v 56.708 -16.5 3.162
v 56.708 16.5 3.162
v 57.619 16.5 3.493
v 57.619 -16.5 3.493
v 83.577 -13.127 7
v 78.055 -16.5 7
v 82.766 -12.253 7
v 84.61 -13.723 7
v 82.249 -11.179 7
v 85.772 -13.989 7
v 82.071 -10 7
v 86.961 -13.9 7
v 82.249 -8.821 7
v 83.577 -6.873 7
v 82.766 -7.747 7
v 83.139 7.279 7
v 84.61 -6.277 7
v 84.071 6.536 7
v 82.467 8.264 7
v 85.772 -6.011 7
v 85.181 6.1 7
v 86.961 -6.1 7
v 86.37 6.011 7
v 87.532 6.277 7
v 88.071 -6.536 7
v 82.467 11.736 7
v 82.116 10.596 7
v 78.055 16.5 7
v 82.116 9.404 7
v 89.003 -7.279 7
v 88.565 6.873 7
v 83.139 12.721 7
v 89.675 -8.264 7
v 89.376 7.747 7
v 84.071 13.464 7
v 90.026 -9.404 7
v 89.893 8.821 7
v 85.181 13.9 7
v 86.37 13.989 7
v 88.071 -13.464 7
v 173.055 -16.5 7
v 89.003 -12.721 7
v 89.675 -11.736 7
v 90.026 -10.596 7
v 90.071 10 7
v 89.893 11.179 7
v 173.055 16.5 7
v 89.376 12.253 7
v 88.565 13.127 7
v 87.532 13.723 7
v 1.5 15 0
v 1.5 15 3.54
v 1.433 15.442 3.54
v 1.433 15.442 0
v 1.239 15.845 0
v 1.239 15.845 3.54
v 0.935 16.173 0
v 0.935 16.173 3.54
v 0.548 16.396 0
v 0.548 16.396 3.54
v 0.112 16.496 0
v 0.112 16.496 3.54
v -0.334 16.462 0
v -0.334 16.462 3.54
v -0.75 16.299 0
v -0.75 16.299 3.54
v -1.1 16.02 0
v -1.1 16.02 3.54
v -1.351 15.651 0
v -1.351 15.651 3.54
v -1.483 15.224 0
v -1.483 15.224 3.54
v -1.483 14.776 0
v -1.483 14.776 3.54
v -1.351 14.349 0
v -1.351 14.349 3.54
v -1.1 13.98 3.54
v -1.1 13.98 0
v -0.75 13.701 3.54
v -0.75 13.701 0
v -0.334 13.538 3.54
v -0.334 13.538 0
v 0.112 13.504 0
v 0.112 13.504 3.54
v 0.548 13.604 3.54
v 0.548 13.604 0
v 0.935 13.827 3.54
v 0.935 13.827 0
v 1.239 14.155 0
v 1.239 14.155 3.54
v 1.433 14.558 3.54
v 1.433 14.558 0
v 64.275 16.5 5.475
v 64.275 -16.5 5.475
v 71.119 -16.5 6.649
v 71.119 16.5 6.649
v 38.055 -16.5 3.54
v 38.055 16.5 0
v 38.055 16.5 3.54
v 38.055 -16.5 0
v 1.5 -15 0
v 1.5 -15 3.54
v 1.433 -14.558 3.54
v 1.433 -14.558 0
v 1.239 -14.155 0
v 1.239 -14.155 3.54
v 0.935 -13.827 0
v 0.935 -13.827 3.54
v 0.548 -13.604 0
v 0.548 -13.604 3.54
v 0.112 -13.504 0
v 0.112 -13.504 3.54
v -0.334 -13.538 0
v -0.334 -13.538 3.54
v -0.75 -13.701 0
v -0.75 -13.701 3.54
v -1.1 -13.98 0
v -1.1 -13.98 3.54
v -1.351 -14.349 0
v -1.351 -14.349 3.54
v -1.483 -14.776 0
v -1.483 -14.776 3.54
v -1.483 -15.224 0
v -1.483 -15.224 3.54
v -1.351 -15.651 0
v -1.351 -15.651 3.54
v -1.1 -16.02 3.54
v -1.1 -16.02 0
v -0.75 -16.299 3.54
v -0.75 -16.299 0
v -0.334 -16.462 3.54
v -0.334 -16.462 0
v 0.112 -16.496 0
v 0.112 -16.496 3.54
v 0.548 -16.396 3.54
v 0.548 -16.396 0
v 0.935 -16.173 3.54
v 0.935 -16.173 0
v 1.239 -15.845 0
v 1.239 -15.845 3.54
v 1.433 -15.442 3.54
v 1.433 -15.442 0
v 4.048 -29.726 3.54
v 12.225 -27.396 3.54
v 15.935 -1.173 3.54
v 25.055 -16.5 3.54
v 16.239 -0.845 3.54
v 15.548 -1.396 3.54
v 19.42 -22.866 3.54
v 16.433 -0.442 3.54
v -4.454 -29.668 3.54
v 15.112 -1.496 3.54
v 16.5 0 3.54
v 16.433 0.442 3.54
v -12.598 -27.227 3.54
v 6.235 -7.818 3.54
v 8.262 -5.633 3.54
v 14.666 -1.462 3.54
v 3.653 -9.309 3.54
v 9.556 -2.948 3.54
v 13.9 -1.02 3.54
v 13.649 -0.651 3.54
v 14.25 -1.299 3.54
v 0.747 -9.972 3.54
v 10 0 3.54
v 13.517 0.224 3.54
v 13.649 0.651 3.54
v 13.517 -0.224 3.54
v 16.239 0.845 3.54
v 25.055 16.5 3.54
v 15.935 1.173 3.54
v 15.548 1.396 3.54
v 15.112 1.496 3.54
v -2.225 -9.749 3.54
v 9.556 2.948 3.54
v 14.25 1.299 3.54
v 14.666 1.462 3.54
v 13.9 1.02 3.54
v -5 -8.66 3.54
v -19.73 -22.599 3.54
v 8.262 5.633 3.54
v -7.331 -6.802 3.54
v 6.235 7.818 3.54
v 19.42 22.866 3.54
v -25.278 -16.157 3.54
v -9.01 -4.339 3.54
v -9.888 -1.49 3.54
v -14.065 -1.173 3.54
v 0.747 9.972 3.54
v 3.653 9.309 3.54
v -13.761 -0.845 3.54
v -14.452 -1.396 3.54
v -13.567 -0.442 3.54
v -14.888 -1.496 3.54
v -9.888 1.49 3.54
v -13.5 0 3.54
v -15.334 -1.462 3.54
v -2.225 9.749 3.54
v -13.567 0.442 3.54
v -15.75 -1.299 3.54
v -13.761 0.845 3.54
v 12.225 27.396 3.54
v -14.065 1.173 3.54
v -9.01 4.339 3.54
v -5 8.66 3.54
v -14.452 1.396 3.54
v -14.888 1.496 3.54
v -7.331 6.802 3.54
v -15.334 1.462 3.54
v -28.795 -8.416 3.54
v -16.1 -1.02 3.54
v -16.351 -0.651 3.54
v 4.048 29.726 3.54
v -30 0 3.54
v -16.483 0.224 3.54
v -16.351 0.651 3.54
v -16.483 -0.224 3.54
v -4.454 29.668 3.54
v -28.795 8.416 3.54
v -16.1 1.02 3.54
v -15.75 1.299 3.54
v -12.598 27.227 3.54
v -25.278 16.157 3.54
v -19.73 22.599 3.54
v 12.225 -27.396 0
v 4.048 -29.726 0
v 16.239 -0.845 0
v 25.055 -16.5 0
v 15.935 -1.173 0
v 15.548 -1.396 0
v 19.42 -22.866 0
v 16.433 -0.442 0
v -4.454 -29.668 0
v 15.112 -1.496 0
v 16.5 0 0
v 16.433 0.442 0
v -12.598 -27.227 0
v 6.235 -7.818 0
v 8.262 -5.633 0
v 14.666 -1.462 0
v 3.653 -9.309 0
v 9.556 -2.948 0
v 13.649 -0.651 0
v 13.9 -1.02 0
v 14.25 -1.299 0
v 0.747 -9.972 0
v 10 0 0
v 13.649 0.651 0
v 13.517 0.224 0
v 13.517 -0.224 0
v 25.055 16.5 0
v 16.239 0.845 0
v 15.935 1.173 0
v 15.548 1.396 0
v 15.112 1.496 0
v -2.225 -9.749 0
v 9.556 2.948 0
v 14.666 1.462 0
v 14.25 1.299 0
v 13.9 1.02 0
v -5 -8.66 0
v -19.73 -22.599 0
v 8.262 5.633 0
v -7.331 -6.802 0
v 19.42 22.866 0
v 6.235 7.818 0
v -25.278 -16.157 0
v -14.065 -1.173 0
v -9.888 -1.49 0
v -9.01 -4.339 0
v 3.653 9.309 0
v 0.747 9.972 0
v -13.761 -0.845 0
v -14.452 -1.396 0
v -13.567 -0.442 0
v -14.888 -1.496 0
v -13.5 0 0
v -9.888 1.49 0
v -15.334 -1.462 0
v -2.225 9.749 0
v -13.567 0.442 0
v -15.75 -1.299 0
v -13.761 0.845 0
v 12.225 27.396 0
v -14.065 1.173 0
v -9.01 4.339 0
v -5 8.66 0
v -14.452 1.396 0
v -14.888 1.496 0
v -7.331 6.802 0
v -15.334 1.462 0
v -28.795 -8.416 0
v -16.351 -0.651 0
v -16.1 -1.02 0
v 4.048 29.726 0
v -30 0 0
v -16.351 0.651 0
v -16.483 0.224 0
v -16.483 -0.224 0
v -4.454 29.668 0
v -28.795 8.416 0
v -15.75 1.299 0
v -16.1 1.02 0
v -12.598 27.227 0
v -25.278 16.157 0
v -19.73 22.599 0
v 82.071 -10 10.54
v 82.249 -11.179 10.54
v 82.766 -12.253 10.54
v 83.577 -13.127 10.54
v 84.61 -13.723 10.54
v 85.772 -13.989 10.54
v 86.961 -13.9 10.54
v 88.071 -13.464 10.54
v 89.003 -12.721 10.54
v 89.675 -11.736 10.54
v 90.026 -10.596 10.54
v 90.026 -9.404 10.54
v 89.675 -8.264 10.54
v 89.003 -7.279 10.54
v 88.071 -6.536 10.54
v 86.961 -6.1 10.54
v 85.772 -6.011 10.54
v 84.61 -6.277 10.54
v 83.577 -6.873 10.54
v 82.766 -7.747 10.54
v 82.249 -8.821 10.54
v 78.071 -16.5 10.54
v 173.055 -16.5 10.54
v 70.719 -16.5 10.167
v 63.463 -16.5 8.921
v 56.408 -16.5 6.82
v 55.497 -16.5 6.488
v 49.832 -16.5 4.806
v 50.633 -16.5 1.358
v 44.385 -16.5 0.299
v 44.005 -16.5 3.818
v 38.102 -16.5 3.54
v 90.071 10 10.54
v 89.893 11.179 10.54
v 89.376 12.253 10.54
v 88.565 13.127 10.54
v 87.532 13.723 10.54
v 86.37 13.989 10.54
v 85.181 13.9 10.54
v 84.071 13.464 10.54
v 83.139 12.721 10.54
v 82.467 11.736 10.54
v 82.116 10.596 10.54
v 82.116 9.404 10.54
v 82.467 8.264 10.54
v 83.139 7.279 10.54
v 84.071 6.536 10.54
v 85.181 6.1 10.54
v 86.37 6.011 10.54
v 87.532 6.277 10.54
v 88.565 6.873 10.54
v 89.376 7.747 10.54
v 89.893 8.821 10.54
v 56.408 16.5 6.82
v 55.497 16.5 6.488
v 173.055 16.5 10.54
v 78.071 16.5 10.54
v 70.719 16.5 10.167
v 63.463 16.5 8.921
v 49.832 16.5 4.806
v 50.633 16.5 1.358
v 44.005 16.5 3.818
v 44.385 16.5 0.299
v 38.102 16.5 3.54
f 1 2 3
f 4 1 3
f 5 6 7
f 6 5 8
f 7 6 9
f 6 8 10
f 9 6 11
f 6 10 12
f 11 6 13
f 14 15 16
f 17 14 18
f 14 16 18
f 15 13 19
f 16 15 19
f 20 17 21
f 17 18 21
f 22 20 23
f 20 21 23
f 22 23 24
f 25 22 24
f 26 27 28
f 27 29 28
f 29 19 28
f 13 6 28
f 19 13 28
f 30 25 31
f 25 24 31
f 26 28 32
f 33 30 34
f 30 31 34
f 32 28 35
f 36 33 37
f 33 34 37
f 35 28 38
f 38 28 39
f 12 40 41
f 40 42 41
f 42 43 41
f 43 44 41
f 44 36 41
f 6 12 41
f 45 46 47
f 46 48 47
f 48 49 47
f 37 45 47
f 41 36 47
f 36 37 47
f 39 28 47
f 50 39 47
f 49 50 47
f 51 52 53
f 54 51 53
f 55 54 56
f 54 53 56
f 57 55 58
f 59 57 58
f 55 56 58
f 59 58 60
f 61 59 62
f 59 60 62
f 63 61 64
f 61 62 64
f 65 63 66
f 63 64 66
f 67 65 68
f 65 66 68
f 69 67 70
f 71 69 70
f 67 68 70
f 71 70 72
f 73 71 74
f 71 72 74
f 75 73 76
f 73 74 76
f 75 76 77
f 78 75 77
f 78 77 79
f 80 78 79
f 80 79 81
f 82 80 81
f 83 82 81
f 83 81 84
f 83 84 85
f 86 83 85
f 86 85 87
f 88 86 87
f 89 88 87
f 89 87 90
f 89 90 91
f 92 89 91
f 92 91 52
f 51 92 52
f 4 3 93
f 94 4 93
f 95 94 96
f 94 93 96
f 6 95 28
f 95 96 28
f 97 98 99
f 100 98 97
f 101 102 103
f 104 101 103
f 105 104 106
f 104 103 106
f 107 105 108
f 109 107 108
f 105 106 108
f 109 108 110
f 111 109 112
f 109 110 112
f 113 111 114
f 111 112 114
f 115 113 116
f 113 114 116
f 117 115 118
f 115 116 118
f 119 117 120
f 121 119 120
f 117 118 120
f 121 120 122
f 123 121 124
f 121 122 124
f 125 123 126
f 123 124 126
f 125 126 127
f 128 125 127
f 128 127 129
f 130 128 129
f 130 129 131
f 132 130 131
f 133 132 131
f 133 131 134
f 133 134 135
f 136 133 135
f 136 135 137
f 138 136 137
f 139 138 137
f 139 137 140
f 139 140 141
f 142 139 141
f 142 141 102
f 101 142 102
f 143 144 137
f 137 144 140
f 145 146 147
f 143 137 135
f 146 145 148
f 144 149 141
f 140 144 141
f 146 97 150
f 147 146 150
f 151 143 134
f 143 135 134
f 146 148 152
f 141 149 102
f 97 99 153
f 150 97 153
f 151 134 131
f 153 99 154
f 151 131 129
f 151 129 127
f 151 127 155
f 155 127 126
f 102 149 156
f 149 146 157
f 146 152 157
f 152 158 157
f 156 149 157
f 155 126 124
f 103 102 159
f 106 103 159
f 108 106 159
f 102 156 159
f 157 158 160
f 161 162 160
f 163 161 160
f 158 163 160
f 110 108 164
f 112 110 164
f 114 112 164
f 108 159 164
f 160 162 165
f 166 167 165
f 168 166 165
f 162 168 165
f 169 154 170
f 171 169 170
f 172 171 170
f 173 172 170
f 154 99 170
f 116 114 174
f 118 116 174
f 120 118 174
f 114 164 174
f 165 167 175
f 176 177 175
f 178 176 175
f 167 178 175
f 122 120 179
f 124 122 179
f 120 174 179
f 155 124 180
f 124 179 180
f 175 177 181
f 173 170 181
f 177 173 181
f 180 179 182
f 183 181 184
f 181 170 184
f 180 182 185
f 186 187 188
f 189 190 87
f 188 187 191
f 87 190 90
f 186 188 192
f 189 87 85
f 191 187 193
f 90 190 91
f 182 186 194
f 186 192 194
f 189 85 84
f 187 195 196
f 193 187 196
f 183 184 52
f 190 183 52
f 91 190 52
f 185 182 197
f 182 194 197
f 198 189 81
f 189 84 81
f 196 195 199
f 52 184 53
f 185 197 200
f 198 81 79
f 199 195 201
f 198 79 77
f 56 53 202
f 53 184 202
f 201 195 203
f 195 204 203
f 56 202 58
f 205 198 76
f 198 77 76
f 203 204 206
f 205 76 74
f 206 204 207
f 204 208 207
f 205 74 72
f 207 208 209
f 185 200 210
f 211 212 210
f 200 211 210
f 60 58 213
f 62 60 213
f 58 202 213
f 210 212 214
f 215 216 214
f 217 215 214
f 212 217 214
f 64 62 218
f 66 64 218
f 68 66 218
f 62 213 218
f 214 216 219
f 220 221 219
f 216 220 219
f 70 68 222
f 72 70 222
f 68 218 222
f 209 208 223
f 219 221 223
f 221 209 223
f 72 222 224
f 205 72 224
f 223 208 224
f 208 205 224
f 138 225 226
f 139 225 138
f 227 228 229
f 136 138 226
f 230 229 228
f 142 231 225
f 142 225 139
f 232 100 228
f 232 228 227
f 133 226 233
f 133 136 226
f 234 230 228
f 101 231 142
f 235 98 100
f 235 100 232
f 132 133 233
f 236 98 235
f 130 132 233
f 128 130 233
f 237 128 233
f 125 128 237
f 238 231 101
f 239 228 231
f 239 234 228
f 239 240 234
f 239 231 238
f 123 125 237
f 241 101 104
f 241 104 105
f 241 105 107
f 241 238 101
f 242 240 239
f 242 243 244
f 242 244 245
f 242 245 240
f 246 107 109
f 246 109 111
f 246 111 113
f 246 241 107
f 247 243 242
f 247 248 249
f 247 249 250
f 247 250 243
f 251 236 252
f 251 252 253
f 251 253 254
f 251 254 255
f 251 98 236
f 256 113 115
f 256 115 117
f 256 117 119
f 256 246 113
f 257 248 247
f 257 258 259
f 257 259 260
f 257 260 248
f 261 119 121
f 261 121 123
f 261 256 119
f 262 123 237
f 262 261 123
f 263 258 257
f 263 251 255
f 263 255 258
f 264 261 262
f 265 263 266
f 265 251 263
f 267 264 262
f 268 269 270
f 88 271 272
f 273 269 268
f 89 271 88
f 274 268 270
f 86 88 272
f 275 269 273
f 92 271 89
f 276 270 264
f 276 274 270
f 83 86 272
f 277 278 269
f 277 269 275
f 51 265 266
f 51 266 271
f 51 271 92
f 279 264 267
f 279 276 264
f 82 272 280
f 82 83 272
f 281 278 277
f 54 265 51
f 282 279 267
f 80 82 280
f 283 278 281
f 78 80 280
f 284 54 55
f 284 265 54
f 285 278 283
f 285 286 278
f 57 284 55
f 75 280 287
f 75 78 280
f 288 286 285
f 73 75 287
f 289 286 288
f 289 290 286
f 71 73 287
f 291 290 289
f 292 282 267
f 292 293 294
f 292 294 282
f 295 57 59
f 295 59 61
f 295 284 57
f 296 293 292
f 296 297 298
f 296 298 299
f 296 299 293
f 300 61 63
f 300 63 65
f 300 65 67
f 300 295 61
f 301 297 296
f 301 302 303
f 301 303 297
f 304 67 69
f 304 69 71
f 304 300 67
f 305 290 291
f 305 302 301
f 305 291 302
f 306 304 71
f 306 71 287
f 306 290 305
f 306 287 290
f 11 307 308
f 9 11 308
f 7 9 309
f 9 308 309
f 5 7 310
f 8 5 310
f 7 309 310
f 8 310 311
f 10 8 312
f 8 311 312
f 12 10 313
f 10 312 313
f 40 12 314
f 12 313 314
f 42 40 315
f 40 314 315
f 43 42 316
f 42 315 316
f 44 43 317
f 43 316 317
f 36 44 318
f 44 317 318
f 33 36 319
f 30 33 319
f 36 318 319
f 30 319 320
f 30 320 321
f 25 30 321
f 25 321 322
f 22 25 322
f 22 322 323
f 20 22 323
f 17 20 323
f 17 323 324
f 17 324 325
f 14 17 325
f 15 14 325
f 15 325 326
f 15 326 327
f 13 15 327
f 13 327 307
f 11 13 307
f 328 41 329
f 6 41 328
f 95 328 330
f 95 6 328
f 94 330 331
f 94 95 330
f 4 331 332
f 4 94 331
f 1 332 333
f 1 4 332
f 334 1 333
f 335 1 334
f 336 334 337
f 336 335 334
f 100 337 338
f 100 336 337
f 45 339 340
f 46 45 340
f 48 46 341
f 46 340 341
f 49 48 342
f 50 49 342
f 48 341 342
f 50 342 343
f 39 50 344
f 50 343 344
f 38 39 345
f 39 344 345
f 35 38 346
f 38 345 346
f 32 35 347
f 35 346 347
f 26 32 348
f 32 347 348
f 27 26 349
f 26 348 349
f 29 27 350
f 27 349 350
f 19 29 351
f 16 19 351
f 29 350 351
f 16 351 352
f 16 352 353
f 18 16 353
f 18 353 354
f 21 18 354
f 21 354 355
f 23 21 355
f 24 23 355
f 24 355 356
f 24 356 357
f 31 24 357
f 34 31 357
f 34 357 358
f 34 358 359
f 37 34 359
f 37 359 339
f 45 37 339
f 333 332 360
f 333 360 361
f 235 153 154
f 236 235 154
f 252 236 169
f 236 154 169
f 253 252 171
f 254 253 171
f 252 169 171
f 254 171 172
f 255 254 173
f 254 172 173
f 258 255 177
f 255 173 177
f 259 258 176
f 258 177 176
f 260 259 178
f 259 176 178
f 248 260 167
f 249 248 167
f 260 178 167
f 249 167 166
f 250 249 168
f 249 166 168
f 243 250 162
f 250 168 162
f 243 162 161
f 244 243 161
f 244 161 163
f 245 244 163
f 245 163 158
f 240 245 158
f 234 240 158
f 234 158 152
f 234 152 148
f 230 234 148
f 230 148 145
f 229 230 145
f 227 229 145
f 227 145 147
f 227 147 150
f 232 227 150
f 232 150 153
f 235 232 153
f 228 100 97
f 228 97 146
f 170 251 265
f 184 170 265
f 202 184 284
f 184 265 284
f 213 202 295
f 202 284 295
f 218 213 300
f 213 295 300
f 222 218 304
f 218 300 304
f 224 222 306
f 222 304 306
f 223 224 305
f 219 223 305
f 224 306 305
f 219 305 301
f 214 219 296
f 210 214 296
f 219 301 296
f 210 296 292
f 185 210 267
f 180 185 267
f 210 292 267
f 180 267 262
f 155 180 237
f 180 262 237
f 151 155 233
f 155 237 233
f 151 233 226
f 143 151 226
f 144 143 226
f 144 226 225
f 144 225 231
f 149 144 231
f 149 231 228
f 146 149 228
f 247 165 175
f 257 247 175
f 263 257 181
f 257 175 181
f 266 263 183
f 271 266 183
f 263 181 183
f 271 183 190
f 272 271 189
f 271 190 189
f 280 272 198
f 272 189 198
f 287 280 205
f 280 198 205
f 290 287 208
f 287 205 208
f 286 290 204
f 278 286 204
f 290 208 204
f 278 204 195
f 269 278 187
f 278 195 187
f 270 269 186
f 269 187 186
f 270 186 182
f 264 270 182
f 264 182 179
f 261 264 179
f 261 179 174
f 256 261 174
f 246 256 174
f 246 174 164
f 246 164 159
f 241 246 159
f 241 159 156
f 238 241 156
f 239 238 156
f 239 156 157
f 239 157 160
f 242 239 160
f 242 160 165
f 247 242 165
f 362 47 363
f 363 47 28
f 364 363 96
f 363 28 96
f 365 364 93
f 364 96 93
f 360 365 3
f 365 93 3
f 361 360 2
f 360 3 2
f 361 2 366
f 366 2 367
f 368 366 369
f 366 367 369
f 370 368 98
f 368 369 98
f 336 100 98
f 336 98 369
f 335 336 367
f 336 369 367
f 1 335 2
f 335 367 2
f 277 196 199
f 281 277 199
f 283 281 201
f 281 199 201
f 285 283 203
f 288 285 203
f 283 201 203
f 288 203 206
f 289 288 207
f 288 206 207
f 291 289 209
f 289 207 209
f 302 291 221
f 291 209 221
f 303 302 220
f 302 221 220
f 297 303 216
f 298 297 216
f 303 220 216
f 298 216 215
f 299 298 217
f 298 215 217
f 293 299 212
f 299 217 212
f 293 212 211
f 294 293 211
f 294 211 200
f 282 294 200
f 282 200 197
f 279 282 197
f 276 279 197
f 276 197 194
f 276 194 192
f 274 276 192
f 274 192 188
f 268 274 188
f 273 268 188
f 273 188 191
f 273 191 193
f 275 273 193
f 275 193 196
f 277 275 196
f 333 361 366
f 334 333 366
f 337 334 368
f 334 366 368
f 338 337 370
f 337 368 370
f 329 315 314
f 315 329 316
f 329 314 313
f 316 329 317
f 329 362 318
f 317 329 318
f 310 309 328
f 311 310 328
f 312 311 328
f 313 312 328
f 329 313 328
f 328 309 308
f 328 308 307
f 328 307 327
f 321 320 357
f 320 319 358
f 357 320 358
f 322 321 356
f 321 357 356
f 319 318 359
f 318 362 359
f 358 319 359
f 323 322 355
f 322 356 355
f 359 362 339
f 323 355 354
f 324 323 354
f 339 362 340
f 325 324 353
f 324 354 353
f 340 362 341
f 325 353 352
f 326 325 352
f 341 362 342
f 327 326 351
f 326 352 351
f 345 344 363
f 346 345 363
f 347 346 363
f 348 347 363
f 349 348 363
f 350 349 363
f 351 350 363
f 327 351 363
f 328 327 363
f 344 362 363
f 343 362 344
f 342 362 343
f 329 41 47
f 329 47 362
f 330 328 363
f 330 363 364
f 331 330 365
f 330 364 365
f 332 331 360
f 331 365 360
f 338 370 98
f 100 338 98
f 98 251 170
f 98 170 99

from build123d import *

# Parameters (mm, degrees)
SKETCH1_R           = 30
BOSS_EXTRUDE1_DEPTH = 3.54
BOSS_EXTRUDE4_START = -3.54
BOSS_EXTRUDE4_DEPTH = 3.54
CUT_EXTRUDE1_REACH  = 50.587
SKETCH5_R           = 10
CUT_EXTRUDE2_REACH  = 50.587
SKETCH6_R           = 1.5
BOSS_EXTRUDE5_DEPTH = 33
SKETCH8_R           = 4
CUT_EXTRUDE3_DEPTH  = 10


with BuildPart() as part:
    # Sketch1 → Boss-Extrude1 (new body)
    with BuildSketch(Plane.XY):
        Circle(SKETCH1_R)
    extrude(amount=BOSS_EXTRUDE1_DEPTH)

    # Sketch4 → Boss-Extrude4 (add)
    with BuildSketch(Plane.XY.offset(3.54).offset(BOSS_EXTRUDE4_START)):
        with BuildLine():
            Line((25.054939633, 16.5), (38.054939633, 16.5))
            Line((38.054939633, 16.5), (38.054939633, -16.5))
            Line((38.054939633, -16.5), (25.054939633, -16.5))
            ThreePointArc((25.054939633, -16.5), (30, 0), (25.054939633, 16.5))
        make_face()
    extrude(amount=BOSS_EXTRUDE4_DEPTH)

    # Sketch5 → Cut-Extrude1 (cut, up to next)
    with BuildSketch(Plane.XY.offset(3.54), mode=Mode.PRIVATE) as cut_extrude1_sk1:
        Circle(SKETCH5_R)
    cut_extrude1_tool1 = extrude(cut_extrude1_sk1.sketch, amount=-CUT_EXTRUDE1_REACH, mode=Mode.PRIVATE) & part.part
    add(cut_extrude1_tool1.solids().sort_by_distance((0, 0, 3.54))[0], mode=Mode.SUBTRACT)

    # Sketch6 → Cut-Extrude2 (cut, up to next)
    with BuildSketch(Plane.XY.offset(3.54), mode=Mode.PRIVATE) as cut_extrude2_sk1:
        with Locations((0, 15)):
            Circle(SKETCH6_R)
    cut_extrude2_tool1 = extrude(cut_extrude2_sk1.sketch, amount=-CUT_EXTRUDE2_REACH, mode=Mode.PRIVATE) & part.part
    # Sketch6 → Cut-Extrude2 (cut, up to next)
    with BuildSketch(Plane.XY.offset(3.54), mode=Mode.PRIVATE) as cut_extrude2_sk2:
        with Locations((15, 0)):
            Circle(SKETCH6_R)
    cut_extrude2_tool2 = extrude(cut_extrude2_sk2.sketch, amount=-CUT_EXTRUDE2_REACH, mode=Mode.PRIVATE) & part.part
    # Sketch6 → Cut-Extrude2 (cut, up to next)
    with BuildSketch(Plane.XY.offset(3.54), mode=Mode.PRIVATE) as cut_extrude2_sk3:
        with Locations((0, -15)):
            Circle(SKETCH6_R)
    cut_extrude2_tool3 = extrude(cut_extrude2_sk3.sketch, amount=-CUT_EXTRUDE2_REACH, mode=Mode.PRIVATE) & part.part
    # Sketch6 → Cut-Extrude2 (cut, up to next)
    with BuildSketch(Plane.XY.offset(3.54), mode=Mode.PRIVATE) as cut_extrude2_sk4:
        with Locations((-15, 0)):
            Circle(SKETCH6_R)
    cut_extrude2_tool4 = extrude(cut_extrude2_sk4.sketch, amount=-CUT_EXTRUDE2_REACH, mode=Mode.PRIVATE) & part.part
    add(cut_extrude2_tool1.solids().sort_by_distance((0, 15, 3.54))[0], mode=Mode.SUBTRACT)
    add(cut_extrude2_tool2.solids().sort_by_distance((15, 0, 3.54))[0], mode=Mode.SUBTRACT)
    add(cut_extrude2_tool3.solids().sort_by_distance((0, -15, 3.54))[0], mode=Mode.SUBTRACT)
    add(cut_extrude2_tool4.solids().sort_by_distance((-15, 0, 3.54))[0], mode=Mode.SUBTRACT)


with BuildPart() as body_2:
    # Sketch7 → Boss-Extrude5 (new body)
    with BuildSketch(Plane(origin=(0, 16.5, 0), x_dir=(1, 0, 0), z_dir=(0, 1, 0))):
        with BuildLine():
            Line((78.054939633, -7), (173.054939633, -7))
            Line((173.054939633, -7), (173.054939633, -10.54))
            Line((173.054939633, -10.54), (78.070990419, -10.54))
            ThreePointArc((78.070990419, -10.54), (67.072567905, -9.651997942), (56.407983509, -6.819951839))
            Line((56.407983509, -6.819951839), (55.496978315, -6.488373065))
            ThreePointArc((55.496978315, -6.488373065), (46.933290058, -4.224083077), (38.101791219, -3.539689948))
            Line((38.101791219, -3.539689948), (38.054939633, 0))
            ThreePointArc((38.054939633, 0), (47.524920739, -0.733872032), (56.707729622, -3.161861188))
            Line((56.707729622, -3.161861188), (57.618734817, -3.493439962))
            ThreePointArc((57.618734817, -3.493439962), (67.679379066, -6.164384916), (78.054939633, -7))
        make_face()
    extrude(amount=-BOSS_EXTRUDE5_DEPTH)

    # Sketch8 → Cut-Extrude3 (cut)
    with BuildSketch(Plane.XY.offset(10.54)):
        with Locations((86.070990419, 10)):
            Circle(SKETCH8_R)
        with Locations(Location((86.070990419, -10, 0), (0, 0, 180))):
            Circle(SKETCH8_R)
    extrude(amount=-CUT_EXTRUDE3_DEPTH, mode=Mode.SUBTRACT)


solid = Compound([part.part, body_2.part])
